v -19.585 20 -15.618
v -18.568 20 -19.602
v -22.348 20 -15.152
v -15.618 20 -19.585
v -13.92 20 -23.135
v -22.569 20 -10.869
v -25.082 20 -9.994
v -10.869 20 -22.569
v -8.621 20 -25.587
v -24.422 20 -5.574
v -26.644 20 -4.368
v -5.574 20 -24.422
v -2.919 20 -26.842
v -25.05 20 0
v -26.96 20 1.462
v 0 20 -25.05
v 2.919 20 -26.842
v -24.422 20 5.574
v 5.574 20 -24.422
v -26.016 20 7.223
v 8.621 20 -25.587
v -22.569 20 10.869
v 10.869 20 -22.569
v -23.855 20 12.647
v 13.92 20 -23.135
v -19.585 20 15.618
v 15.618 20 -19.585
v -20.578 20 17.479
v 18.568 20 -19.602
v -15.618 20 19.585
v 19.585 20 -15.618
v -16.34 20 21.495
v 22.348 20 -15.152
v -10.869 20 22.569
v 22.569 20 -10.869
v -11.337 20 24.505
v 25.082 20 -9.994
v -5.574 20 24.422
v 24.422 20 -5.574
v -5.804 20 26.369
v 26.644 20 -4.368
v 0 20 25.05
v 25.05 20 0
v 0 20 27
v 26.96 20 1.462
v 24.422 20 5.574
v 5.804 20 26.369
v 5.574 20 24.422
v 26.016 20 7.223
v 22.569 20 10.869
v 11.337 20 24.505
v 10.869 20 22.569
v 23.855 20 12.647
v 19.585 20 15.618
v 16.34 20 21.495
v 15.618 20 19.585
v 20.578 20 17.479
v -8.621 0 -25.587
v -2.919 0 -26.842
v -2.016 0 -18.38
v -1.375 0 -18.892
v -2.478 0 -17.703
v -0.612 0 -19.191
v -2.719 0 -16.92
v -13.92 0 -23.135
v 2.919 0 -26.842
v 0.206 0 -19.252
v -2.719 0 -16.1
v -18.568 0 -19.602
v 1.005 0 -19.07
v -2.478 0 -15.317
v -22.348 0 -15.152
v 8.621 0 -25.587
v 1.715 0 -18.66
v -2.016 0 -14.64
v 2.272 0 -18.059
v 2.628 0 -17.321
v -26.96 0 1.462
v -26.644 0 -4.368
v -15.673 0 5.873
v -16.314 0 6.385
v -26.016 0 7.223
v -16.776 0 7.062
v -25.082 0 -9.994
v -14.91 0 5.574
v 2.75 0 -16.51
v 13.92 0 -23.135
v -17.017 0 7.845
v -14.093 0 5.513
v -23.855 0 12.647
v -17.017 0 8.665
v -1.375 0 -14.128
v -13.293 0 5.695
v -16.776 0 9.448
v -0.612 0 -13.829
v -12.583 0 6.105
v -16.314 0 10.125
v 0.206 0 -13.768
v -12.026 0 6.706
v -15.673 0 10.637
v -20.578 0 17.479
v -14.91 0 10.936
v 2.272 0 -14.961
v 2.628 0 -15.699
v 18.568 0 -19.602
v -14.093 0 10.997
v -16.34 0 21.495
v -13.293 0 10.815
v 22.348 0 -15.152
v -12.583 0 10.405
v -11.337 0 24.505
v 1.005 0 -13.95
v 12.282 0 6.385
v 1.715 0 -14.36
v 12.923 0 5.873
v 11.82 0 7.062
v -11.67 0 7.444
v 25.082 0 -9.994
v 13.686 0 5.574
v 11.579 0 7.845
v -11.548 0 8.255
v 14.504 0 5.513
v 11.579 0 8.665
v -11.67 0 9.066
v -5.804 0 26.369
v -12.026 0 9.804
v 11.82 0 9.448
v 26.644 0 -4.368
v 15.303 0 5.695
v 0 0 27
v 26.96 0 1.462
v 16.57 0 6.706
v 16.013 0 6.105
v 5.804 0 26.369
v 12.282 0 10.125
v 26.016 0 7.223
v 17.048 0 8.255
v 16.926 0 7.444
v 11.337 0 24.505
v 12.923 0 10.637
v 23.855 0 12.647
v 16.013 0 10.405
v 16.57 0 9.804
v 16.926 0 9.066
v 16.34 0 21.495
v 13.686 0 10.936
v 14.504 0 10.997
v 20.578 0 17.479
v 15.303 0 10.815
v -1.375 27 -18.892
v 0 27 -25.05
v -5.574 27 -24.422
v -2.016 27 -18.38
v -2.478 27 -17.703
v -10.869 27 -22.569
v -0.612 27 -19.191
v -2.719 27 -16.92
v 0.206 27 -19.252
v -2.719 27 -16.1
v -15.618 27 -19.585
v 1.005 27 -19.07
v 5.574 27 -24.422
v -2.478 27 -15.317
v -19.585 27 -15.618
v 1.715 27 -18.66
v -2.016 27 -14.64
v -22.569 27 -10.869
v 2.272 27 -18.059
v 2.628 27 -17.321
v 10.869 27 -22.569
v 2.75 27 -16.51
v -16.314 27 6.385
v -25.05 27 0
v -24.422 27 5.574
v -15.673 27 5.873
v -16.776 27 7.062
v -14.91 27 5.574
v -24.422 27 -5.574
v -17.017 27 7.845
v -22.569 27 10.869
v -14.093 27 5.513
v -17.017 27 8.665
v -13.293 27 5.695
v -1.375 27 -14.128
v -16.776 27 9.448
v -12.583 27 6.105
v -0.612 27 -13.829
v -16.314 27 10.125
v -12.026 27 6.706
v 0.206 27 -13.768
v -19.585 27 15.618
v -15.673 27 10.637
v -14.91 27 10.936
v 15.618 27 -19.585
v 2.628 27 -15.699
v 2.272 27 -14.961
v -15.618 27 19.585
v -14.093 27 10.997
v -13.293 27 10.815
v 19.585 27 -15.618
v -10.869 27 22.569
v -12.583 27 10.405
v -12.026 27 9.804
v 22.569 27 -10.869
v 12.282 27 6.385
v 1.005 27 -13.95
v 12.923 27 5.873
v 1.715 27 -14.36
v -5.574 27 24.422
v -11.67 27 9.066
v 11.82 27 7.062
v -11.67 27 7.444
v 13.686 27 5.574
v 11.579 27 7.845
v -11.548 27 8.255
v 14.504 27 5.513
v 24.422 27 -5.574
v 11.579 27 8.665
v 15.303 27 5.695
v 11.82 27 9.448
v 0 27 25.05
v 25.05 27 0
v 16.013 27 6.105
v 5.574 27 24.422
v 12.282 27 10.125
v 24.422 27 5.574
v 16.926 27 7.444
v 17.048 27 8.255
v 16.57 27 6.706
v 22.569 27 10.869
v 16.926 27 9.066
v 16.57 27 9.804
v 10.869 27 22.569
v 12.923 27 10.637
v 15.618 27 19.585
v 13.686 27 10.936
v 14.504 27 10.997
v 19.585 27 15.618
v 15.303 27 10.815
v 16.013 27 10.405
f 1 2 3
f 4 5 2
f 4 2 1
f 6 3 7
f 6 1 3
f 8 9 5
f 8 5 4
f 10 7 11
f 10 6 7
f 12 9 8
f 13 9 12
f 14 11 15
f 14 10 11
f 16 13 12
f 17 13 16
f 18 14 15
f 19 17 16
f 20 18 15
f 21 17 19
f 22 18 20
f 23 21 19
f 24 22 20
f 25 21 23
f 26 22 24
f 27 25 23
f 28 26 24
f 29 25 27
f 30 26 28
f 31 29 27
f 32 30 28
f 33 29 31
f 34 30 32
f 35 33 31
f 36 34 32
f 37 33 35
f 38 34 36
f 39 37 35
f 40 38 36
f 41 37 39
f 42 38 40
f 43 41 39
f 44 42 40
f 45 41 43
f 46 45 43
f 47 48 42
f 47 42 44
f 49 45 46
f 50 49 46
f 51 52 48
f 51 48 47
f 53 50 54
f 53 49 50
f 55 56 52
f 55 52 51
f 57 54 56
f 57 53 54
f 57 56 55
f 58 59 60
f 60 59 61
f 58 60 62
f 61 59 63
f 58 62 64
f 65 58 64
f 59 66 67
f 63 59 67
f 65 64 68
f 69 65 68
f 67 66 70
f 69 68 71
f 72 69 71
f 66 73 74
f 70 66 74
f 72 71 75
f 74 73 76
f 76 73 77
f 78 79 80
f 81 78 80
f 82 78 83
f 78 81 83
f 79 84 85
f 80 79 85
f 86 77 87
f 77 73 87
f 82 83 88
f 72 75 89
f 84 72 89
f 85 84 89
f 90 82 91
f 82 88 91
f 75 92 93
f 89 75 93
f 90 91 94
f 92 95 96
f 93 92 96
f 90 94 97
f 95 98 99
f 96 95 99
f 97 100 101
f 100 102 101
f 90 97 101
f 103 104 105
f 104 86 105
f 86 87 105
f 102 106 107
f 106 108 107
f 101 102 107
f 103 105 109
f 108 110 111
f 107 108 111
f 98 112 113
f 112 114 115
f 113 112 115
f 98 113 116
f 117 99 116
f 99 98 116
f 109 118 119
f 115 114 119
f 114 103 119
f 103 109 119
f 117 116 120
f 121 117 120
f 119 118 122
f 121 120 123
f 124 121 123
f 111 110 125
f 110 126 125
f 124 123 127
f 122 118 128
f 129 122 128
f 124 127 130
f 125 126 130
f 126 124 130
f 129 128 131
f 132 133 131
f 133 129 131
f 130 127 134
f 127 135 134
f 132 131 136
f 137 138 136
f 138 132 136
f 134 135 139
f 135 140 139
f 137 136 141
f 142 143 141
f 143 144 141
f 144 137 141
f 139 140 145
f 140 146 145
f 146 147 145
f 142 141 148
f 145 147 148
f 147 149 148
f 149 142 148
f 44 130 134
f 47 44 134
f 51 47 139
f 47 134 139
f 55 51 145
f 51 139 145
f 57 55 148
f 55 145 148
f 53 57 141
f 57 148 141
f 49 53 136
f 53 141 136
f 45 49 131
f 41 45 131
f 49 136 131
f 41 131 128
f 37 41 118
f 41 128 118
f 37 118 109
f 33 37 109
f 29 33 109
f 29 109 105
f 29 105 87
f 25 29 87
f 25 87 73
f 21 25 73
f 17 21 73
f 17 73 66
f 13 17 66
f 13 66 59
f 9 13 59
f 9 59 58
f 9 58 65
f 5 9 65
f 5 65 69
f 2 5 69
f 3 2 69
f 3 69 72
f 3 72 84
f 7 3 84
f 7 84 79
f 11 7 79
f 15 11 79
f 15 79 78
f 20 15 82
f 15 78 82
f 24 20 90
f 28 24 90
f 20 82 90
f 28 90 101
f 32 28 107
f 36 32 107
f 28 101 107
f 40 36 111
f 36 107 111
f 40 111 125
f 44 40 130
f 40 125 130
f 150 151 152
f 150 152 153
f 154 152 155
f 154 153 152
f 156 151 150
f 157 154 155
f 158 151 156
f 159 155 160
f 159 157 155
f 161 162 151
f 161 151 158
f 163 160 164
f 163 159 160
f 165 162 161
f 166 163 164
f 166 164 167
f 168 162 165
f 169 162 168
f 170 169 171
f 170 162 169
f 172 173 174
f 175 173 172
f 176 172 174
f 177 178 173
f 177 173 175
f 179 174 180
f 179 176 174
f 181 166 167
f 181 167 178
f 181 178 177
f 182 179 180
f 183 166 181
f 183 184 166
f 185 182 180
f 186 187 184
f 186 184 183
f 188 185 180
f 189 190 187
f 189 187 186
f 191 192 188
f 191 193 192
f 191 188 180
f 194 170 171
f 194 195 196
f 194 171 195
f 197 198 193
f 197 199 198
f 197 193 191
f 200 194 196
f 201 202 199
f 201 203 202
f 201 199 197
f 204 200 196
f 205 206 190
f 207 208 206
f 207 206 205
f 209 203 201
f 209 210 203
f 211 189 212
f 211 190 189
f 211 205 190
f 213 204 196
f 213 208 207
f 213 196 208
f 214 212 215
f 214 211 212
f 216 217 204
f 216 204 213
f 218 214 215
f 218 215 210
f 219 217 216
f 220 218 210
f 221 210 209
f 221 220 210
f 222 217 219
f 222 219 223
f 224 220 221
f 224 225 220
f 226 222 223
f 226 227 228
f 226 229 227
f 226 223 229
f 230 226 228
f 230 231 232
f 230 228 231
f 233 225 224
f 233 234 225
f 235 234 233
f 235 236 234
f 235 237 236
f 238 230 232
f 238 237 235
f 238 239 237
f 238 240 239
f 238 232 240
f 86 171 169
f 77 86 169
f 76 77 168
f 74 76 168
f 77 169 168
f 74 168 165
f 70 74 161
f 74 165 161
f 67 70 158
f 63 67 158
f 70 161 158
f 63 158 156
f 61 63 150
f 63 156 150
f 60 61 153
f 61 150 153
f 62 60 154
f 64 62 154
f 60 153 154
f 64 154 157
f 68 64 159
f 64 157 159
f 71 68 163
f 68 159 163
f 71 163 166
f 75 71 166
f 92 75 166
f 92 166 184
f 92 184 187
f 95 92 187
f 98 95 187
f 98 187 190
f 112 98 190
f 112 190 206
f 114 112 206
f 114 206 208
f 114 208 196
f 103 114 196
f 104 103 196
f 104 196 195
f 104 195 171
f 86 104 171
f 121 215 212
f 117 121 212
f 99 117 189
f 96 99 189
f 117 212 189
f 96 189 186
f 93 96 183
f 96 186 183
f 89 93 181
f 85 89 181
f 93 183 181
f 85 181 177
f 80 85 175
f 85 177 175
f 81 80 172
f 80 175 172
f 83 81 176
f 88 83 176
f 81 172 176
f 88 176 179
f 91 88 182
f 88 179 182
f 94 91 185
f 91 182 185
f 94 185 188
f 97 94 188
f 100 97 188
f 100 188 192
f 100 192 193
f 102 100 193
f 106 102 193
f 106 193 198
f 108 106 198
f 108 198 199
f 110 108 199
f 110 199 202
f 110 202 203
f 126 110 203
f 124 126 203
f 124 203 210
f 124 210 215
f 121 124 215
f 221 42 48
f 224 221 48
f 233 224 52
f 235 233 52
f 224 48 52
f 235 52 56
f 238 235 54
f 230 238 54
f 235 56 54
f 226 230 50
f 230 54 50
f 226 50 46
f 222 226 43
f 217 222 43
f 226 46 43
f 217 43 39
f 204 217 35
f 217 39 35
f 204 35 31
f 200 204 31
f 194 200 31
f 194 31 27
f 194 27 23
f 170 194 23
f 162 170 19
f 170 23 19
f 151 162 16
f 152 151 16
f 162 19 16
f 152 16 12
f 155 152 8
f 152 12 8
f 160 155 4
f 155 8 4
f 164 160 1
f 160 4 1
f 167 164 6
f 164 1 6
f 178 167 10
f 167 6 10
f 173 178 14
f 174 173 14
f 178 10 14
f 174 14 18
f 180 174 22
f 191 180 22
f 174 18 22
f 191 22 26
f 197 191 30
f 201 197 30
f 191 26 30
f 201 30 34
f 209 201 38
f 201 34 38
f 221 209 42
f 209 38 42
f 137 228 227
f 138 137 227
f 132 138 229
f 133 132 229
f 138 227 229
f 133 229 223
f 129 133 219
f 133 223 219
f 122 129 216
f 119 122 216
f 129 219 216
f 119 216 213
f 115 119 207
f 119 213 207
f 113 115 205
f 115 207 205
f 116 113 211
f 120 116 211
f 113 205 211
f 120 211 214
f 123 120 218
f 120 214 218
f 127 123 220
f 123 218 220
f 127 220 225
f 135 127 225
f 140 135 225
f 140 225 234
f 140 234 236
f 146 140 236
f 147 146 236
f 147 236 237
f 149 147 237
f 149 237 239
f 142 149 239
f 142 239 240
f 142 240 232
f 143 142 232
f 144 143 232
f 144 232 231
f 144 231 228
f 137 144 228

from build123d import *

# Parameters (mm, degrees)
SKETCH2_R            = 27
BOSS_EXTRUDE2_DEPTH  = 27
M5_CLEARANCE_HOLE1_D = 5.5
CUT_EXTRUDE1_START   = -7
SKETCH10_R           = 27
SKETCH10_R_2         = 25.05
CUT_EXTRUDE1_DEPTH   = 7


with BuildPart() as part:
    # Sketch2 → Boss-Extrude2 (new body)
    with BuildSketch(Plane(origin=(0, 0, 0), x_dir=(1, 0, 0), z_dir=(0, 1, 0))):
        with Locations(Location((0, 0, 0), (0, 0, 270))):
            Circle(SKETCH2_R)
    extrude(amount=BOSS_EXTRUDE2_DEPTH)

    # M5 Clearance Hole1 (through all)
    with Locations(Plane(origin=(0, 0, 0), x_dir=(-1, 0, 0), z_dir=(0, -1, 0))):
        with Locations((14.298079416, -8.255), (0, 16.51), (-14.298079416, -8.255)):
            Hole(M5_CLEARANCE_HOLE1_D / 2)

    # Sketch10 → Cut-Extrude1 (cut)
    with BuildSketch(Plane(origin=(0, 27, 0), x_dir=(1, 0, 0), z_dir=(0, 1, 0)).offset(CUT_EXTRUDE1_START)):
        with Locations(Location((0, 0, 0), (0, 0, 270))):
            Circle(SKETCH10_R)
        with Locations(Location((0, 0, 0), (0, 0, 270))):
            Circle(SKETCH10_R_2, mode=Mode.SUBTRACT)
    extrude(amount=CUT_EXTRUDE1_DEPTH, mode=Mode.SUBTRACT)


solid = part.part
